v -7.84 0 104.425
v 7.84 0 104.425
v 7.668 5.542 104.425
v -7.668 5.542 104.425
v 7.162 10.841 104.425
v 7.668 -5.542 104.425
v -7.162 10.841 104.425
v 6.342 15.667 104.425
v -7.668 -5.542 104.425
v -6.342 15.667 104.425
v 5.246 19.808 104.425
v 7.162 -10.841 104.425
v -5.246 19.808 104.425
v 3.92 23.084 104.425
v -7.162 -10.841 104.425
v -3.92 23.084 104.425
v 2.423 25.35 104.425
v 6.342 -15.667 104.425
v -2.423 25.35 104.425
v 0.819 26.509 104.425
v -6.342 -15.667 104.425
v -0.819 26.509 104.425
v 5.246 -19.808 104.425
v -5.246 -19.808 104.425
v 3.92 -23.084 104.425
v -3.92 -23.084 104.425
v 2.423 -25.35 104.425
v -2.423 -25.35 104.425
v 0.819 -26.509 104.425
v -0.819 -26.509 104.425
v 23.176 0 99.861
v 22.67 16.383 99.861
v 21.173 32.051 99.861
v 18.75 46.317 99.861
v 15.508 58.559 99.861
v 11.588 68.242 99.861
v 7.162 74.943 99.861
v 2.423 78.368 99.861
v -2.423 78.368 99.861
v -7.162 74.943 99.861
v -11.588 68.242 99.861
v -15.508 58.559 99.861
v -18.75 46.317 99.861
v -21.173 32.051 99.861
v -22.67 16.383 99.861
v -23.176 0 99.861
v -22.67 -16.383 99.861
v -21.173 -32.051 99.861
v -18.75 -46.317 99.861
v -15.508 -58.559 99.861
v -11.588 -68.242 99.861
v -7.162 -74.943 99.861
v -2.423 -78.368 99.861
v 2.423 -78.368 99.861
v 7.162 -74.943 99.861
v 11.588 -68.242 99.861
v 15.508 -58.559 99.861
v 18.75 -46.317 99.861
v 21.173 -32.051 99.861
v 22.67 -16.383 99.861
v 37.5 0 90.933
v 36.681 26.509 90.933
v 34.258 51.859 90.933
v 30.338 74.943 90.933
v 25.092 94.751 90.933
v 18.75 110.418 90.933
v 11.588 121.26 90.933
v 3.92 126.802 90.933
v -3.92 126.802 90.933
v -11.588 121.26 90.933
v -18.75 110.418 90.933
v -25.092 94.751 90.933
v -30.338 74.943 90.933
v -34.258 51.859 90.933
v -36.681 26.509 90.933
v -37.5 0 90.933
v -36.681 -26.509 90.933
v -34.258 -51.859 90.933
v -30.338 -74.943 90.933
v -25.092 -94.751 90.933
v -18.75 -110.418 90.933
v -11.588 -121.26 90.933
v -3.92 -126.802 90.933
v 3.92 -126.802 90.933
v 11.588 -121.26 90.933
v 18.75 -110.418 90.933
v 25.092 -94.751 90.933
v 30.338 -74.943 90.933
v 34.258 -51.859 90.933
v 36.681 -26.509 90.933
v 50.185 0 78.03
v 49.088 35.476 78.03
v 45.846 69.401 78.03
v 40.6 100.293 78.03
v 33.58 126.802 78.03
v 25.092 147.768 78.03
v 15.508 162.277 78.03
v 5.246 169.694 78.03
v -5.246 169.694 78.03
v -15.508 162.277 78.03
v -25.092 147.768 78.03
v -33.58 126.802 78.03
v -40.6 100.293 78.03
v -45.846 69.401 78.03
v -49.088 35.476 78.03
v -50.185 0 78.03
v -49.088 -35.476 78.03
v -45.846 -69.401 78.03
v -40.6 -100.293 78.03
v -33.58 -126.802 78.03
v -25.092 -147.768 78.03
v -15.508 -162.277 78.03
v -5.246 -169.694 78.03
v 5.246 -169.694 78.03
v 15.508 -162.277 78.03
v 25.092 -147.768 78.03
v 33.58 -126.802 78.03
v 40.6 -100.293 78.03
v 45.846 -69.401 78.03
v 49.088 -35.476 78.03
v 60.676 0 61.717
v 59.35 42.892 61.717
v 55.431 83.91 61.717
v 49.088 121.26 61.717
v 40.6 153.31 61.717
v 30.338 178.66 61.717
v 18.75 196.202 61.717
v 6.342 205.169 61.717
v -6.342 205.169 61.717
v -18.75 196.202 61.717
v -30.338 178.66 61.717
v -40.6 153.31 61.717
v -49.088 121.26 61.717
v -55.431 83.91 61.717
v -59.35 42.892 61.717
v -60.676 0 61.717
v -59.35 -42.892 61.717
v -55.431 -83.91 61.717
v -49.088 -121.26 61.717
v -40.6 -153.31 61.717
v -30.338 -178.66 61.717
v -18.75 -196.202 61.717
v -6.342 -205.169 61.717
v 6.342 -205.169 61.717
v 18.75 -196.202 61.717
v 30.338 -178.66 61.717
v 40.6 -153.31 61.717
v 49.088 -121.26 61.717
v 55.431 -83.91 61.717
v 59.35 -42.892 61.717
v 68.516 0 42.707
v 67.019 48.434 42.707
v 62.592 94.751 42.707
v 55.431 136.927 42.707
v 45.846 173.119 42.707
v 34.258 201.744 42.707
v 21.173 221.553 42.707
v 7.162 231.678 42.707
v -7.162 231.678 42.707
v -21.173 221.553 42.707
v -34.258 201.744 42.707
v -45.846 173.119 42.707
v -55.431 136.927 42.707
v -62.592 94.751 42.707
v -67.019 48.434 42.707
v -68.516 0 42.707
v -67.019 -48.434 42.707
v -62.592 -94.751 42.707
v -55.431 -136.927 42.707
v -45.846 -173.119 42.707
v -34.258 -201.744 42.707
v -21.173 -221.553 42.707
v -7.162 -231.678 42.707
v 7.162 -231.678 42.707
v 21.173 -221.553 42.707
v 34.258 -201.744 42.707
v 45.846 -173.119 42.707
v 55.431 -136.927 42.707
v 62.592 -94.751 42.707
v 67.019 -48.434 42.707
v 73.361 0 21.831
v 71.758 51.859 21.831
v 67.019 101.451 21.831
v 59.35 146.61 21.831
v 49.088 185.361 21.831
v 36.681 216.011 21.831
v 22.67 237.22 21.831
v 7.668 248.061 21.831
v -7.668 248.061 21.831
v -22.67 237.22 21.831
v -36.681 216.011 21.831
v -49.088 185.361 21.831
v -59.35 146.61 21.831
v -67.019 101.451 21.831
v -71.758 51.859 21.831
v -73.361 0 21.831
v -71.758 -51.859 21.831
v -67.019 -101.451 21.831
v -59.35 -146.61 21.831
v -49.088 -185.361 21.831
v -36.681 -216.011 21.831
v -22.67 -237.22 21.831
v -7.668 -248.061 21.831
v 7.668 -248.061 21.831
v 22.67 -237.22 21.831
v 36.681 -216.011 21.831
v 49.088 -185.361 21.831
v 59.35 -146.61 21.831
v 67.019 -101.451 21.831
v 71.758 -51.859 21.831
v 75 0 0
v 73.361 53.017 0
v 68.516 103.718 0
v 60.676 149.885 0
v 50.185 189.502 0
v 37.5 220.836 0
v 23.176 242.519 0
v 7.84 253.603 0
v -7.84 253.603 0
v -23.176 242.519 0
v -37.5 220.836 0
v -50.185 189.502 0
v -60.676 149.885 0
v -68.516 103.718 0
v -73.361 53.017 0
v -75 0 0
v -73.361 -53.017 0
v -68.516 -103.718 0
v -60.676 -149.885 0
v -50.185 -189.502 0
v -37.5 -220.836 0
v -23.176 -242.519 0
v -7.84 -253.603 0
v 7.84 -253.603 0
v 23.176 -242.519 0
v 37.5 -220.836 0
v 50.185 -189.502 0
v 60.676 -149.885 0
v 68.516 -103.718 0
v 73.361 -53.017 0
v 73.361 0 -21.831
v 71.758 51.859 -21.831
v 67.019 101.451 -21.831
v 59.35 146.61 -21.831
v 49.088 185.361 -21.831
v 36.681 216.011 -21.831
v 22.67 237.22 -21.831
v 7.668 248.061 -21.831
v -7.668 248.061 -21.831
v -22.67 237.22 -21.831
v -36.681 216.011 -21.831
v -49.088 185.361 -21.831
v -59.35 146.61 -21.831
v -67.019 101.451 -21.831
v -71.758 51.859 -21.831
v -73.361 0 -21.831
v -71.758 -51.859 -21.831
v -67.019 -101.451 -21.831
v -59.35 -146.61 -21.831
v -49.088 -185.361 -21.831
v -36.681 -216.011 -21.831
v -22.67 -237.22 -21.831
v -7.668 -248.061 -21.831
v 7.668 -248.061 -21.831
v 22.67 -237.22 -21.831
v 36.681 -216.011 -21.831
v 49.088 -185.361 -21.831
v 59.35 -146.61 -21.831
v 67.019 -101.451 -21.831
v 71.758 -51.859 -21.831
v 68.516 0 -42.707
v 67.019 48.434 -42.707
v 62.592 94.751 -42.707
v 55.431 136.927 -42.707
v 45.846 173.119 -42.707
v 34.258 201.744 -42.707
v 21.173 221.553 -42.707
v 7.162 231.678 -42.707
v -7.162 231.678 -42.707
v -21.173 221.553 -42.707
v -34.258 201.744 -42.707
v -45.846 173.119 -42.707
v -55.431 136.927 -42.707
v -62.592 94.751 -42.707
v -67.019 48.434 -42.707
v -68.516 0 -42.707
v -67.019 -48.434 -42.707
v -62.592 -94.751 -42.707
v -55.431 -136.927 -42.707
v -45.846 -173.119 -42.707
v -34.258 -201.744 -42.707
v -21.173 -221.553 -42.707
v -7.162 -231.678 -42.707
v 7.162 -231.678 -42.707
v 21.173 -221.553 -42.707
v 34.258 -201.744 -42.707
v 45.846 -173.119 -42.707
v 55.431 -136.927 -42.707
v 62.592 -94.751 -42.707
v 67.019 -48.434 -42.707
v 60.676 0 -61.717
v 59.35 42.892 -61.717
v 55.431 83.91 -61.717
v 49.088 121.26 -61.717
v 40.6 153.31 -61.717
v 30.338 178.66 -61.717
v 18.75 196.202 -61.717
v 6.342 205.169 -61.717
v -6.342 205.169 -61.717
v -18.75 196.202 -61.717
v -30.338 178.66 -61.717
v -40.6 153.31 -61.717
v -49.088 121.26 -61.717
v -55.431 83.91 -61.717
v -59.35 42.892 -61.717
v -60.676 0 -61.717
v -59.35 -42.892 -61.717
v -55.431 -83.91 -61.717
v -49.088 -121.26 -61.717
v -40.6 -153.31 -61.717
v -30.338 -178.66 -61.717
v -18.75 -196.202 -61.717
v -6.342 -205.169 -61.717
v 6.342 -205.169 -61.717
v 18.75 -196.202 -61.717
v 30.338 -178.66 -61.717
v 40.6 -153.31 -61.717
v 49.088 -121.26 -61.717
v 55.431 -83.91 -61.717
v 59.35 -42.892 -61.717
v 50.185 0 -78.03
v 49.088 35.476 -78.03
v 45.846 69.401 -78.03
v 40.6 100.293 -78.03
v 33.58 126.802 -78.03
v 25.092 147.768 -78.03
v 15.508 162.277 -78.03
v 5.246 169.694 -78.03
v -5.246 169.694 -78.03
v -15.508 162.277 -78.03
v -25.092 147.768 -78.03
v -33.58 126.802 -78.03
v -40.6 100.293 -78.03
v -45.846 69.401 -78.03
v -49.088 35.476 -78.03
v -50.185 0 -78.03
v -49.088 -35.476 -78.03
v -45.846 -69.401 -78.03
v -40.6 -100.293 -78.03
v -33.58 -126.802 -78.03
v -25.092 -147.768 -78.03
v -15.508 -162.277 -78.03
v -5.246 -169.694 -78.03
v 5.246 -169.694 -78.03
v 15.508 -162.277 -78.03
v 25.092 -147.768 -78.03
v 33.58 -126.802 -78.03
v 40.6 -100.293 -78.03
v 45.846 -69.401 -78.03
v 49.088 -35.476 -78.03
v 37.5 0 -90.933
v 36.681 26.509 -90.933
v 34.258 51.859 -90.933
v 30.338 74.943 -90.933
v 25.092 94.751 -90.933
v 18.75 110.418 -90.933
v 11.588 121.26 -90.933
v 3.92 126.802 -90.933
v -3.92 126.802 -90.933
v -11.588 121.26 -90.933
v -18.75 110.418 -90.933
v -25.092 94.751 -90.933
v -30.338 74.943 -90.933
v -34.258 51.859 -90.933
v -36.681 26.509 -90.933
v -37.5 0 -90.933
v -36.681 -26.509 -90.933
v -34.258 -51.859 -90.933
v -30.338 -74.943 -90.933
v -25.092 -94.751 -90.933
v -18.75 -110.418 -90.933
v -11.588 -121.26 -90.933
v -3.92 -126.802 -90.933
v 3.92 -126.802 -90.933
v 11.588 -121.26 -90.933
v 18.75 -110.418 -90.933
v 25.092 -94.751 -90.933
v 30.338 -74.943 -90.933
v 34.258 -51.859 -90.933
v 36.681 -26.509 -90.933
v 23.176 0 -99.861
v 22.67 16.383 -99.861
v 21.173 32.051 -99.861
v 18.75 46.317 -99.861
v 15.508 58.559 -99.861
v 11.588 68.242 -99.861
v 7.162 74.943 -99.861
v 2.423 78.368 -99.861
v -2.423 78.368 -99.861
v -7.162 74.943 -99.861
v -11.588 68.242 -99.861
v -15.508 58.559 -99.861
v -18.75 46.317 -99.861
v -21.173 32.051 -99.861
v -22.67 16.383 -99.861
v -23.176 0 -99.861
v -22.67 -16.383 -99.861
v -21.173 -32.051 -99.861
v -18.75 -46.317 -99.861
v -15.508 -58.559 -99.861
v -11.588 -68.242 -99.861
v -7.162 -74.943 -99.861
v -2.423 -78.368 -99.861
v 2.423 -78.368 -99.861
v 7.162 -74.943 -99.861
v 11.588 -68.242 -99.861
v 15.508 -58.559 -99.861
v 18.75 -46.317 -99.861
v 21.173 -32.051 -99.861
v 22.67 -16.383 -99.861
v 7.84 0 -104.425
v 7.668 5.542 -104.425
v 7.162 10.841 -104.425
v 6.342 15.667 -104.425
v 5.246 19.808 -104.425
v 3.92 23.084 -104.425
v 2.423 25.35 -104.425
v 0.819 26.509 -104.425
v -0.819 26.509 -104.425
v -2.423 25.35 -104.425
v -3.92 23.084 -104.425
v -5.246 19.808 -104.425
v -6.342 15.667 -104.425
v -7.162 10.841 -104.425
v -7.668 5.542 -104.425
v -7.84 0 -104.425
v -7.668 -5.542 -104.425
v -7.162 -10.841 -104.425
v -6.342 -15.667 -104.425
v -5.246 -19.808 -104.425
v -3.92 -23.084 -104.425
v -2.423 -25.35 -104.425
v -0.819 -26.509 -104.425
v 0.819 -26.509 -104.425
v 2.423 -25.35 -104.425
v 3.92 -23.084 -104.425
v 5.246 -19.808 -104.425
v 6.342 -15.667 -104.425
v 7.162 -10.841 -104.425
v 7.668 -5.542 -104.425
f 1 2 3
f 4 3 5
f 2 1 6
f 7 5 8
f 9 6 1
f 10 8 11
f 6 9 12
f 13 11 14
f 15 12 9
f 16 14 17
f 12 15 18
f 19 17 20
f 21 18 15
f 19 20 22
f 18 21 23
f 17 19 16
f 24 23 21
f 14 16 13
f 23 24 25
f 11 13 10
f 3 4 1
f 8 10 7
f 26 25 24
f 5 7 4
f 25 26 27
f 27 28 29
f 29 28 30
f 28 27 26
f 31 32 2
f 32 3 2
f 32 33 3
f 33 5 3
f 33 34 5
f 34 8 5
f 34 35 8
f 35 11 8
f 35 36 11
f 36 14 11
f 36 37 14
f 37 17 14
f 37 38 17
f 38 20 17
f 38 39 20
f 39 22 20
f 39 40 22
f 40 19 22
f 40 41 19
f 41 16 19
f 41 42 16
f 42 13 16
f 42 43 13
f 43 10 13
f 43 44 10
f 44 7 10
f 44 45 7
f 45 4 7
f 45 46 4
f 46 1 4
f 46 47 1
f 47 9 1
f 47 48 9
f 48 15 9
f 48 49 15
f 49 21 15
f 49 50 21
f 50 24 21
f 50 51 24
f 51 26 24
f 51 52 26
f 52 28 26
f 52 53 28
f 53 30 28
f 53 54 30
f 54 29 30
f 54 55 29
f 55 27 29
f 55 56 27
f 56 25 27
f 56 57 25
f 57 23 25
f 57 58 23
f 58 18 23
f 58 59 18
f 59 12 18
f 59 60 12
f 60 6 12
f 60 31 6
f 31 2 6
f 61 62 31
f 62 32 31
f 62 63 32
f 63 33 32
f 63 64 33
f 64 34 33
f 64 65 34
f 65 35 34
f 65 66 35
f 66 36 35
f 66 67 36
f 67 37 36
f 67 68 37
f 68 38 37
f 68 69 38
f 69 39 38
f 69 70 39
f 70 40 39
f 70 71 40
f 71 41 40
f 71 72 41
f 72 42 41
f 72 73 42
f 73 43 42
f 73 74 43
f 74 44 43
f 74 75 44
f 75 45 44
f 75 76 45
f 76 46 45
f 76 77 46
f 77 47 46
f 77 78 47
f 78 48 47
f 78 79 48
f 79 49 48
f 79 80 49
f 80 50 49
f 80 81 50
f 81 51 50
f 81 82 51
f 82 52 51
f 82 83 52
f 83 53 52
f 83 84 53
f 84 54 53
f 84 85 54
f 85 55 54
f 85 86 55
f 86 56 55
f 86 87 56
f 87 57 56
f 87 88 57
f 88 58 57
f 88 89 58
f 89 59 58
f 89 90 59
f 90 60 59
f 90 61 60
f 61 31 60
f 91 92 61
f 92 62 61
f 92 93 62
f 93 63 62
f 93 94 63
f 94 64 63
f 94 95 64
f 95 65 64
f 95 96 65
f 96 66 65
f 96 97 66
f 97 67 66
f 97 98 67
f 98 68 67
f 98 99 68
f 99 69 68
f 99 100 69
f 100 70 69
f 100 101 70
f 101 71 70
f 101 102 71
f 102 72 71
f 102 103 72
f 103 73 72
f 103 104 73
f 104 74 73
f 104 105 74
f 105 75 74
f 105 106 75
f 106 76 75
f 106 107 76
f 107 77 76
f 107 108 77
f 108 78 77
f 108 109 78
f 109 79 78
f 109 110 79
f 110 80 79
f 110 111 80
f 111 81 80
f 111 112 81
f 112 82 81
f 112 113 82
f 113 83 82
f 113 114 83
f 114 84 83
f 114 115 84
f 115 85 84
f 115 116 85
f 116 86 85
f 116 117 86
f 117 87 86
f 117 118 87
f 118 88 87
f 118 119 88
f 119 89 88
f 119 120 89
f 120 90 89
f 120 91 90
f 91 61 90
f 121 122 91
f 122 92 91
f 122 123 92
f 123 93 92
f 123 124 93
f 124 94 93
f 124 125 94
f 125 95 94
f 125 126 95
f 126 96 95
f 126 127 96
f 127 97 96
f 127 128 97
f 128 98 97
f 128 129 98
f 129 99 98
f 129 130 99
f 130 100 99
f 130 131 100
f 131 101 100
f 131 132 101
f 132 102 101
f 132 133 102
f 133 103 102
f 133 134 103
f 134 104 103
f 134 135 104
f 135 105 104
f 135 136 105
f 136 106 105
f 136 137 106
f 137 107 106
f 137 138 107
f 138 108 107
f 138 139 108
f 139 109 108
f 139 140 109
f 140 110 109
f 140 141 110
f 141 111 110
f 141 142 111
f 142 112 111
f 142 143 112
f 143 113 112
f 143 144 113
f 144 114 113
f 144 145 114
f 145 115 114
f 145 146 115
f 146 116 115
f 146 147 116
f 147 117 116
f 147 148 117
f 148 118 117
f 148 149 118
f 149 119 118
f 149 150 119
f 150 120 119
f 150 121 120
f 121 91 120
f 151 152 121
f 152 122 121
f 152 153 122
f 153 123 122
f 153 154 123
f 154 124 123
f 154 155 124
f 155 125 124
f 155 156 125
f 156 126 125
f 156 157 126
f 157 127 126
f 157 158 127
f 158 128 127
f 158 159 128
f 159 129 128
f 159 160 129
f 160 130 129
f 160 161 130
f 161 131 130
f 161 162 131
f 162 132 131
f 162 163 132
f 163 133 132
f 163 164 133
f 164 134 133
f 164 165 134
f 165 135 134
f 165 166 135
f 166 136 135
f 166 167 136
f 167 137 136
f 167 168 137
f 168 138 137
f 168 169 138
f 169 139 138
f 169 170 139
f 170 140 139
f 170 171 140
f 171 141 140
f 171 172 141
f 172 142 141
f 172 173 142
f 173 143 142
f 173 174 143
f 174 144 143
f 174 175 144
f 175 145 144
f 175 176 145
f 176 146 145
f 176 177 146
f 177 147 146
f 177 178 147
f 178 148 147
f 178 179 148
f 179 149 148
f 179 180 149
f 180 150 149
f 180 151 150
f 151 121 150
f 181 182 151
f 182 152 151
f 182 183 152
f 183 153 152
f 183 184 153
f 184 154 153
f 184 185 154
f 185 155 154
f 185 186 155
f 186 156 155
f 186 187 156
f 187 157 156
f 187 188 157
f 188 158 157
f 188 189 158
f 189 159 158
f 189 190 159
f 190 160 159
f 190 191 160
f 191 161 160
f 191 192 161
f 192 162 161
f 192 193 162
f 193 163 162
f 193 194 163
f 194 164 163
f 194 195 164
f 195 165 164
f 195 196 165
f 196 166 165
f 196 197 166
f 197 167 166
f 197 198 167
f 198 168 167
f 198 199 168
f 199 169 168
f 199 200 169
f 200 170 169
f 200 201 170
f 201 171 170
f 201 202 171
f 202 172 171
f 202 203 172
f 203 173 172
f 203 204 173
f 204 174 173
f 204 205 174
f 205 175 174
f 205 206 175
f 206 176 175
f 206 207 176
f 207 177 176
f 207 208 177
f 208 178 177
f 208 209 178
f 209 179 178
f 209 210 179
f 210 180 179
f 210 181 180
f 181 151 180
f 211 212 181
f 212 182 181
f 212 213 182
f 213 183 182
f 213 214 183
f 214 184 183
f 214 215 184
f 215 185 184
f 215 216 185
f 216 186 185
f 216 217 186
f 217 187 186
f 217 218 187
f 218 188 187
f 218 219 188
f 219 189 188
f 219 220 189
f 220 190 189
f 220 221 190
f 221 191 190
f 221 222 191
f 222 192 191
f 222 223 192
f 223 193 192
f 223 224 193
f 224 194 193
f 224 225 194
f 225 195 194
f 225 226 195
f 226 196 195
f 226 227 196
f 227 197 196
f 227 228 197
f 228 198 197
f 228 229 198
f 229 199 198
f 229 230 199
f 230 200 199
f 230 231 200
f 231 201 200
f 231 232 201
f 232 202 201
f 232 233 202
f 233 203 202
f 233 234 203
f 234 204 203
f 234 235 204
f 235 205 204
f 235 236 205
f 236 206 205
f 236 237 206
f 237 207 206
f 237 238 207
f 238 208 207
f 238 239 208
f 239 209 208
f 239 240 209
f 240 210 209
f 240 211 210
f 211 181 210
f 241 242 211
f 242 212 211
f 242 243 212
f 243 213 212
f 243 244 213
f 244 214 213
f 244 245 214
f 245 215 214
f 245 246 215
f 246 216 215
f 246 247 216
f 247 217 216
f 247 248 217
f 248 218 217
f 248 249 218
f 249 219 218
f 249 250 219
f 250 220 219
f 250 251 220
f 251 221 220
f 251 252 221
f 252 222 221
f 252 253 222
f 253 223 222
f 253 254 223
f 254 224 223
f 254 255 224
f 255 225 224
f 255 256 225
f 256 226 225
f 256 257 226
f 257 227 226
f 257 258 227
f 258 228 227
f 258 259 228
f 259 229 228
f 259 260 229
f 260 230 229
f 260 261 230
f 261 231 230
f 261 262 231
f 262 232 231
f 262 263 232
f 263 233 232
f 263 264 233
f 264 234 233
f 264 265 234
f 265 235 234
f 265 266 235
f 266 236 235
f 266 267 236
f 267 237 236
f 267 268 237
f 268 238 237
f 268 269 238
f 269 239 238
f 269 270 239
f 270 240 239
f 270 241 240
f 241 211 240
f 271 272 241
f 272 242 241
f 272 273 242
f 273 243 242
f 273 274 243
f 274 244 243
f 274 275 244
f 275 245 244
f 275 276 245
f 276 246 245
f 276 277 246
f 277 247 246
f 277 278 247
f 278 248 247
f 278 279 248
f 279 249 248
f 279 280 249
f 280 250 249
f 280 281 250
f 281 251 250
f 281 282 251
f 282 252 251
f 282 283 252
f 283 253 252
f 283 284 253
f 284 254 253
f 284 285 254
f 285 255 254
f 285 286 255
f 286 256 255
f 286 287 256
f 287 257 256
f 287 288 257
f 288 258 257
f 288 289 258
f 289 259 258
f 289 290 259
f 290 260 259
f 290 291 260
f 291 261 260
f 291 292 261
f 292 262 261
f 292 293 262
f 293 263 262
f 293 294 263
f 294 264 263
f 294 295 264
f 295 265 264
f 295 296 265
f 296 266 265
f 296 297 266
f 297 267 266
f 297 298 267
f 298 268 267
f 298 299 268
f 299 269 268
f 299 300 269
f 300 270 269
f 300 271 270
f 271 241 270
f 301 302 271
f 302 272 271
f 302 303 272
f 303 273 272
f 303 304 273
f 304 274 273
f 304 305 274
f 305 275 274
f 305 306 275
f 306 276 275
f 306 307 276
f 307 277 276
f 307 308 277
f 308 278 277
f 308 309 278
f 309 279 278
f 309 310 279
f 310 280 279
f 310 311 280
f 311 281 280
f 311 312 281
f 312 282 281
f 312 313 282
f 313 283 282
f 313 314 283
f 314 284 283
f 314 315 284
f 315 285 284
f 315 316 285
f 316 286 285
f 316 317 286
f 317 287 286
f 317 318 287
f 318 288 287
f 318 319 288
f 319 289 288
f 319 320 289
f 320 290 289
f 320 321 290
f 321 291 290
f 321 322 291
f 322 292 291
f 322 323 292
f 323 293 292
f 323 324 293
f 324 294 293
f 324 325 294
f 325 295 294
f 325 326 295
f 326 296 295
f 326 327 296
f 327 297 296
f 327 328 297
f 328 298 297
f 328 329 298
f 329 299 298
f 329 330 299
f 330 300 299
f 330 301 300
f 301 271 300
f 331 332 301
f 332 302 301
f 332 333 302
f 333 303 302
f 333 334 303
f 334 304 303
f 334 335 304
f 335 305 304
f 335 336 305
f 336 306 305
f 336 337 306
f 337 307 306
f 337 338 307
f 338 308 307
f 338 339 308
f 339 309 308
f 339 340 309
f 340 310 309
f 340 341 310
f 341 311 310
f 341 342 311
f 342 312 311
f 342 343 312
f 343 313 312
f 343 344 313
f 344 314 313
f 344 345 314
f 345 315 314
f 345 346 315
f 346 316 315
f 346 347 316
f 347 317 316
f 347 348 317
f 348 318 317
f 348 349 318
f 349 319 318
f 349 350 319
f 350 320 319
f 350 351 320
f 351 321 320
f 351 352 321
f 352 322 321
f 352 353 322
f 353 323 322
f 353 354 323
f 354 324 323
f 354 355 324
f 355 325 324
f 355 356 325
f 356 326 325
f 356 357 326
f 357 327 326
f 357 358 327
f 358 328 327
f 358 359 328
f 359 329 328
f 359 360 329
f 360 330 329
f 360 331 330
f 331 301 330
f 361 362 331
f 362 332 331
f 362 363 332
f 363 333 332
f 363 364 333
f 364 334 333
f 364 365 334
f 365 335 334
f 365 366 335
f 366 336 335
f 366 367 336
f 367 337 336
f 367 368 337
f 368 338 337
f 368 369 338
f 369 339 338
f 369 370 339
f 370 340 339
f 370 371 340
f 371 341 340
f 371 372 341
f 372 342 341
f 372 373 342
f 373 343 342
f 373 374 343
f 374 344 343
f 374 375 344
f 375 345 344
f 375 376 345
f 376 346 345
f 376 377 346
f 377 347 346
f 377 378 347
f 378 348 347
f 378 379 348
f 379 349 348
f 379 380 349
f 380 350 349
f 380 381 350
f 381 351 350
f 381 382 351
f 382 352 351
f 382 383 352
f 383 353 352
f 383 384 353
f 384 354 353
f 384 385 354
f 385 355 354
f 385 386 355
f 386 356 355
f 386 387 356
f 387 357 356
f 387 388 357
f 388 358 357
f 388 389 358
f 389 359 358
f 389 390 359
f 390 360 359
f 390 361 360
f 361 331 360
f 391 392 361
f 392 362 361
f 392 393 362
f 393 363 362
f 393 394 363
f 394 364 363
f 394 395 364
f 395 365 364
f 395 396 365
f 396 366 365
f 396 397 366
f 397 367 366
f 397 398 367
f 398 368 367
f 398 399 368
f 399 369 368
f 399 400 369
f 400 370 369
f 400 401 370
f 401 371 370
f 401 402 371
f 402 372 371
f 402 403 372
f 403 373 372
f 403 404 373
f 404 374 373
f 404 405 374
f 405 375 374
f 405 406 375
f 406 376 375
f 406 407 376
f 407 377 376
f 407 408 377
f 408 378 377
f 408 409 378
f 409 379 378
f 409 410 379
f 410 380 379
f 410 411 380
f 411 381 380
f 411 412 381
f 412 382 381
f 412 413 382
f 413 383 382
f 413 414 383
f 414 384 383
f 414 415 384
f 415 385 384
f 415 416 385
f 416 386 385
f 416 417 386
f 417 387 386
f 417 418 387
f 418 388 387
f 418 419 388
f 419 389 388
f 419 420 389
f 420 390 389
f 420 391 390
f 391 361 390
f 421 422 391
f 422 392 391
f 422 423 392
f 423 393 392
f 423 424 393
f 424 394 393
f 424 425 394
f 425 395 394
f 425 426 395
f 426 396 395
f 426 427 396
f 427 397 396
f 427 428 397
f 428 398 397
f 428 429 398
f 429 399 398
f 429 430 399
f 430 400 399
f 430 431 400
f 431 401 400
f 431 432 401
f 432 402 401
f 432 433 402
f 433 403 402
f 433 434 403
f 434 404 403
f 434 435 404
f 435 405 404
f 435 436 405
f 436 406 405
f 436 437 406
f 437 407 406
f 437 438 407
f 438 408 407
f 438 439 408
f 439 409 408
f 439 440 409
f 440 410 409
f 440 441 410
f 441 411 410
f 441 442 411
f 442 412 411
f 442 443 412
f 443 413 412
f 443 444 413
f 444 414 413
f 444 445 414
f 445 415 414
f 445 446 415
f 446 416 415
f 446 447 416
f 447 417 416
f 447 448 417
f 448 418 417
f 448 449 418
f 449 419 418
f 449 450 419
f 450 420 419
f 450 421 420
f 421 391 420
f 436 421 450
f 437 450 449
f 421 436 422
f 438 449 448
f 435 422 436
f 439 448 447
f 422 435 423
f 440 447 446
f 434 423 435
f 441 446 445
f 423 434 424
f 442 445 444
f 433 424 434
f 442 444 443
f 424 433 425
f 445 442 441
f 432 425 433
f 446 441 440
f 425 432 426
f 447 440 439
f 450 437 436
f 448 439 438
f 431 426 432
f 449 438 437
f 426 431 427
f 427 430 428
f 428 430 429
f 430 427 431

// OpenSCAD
// Generated by SolidPython 1.0.1 on 2020-07-29 00:46:46


scale(v = [5, 17, 7]) {
	sphere(r = 15);
}
/***********************************************
*********      SolidPython code:      **********
************************************************
 
# import packages: SolidPython
from solid import *
from solid.utils import *
from itertools import chain, combinations, permutations


class Resize:

    def __init__(self, scad_file):
        self.scad_file = scad_file
        #self.scad_file = import_scad(scad_file)
        # cone/cylinder param:
        self.r1 = 0
        self.r2 = 0
        self.h = 0
        # rectangular prism param:
        self.w = 0
        self.l = 0
        # ellipse param:
        self.r = 0

    # import OpenScad code (file name corresponds to shape)


    # classify shape + parameters
    def assign(self, param1, param2, param3):
        if self.scad_file == 'cone.scad':
            self.r1 = param1
            self.r2 = param2
            self.h = param3
        elif self.scad_file == 'cylinder.scad':
            self.r1 = param1
            self.r2 = param2
            self.h = param3
        elif self.scad_file == 'rectangularPrism.scad':
            self.h = param1
            self.l = param2
            self.w = param3
        else:
            self.r = param1
            self.h = param2

    # resize parameters
    def iterate(self):
        x = range(3, 20, 2)
        i = 1
        if self.scad_file == 'cone.scad':
            tempList = list(permutations(x, 2))
            for temp in tempList:
                param1 = temp[0]
                param2 = temp[1]
                filepath = 'produced_scad_files/' + 'cone' + str(param1) + '_' + str(param2) + '_' + '.scad'
                scad_render_to_file(cylinder(h=param1, r1=param2, r2=0), filepath)

        elif self.scad_file == 'cylinder.scad':
            tempList = list(permutations(x, 3))
            for temp in tempList:
                param1 = temp[0]
                param2 = temp[1]
                filepath = 'produced_scad_files/' + 'cylinder' + str(param1) + '_' + str(param2) + '_' + '.scad'
                scad_render_to_file(cylinder(h=param1, r1=param2, r2=param2), filepath)

        elif self.scad_file == 'rectangularPrism.scad':
            tempList = list(permutations(x, 3))
            for temp in tempList:
                param1 = temp[0]
                param2 = temp[1]
                param3 = temp[2]
                filepath = 'produced_scad_files/' + 'rectangularPrism' + str(param1) + '_' + str(param2) + '_' + str(
                    param3) + '.scad'
                scad_render_to_file(cube(size=(param1, param2, param3)), filepath)

        elif self.scad_file == 'ellipse.scad':
            tempList = list(permutations(x, 4))
            for temp in tempList:
                param1 = temp[0]
                param2 = temp[1]
                param3 = temp[2]
                param4 = temp[3]
                filepath = 'produced_scad_files/' + 'ellipse' + str(param1) + '_' + str(param2) + '_' + str(param3) + '_' + str(param4) + '.scad'
                scad_render_to_file(scale([param1, param2, param3])(sphere(r=param4)), filepath)

    def render_to_scadfile(self):
        scad_render_to_file(scad, 'example.scad') 
 
************************************************/
